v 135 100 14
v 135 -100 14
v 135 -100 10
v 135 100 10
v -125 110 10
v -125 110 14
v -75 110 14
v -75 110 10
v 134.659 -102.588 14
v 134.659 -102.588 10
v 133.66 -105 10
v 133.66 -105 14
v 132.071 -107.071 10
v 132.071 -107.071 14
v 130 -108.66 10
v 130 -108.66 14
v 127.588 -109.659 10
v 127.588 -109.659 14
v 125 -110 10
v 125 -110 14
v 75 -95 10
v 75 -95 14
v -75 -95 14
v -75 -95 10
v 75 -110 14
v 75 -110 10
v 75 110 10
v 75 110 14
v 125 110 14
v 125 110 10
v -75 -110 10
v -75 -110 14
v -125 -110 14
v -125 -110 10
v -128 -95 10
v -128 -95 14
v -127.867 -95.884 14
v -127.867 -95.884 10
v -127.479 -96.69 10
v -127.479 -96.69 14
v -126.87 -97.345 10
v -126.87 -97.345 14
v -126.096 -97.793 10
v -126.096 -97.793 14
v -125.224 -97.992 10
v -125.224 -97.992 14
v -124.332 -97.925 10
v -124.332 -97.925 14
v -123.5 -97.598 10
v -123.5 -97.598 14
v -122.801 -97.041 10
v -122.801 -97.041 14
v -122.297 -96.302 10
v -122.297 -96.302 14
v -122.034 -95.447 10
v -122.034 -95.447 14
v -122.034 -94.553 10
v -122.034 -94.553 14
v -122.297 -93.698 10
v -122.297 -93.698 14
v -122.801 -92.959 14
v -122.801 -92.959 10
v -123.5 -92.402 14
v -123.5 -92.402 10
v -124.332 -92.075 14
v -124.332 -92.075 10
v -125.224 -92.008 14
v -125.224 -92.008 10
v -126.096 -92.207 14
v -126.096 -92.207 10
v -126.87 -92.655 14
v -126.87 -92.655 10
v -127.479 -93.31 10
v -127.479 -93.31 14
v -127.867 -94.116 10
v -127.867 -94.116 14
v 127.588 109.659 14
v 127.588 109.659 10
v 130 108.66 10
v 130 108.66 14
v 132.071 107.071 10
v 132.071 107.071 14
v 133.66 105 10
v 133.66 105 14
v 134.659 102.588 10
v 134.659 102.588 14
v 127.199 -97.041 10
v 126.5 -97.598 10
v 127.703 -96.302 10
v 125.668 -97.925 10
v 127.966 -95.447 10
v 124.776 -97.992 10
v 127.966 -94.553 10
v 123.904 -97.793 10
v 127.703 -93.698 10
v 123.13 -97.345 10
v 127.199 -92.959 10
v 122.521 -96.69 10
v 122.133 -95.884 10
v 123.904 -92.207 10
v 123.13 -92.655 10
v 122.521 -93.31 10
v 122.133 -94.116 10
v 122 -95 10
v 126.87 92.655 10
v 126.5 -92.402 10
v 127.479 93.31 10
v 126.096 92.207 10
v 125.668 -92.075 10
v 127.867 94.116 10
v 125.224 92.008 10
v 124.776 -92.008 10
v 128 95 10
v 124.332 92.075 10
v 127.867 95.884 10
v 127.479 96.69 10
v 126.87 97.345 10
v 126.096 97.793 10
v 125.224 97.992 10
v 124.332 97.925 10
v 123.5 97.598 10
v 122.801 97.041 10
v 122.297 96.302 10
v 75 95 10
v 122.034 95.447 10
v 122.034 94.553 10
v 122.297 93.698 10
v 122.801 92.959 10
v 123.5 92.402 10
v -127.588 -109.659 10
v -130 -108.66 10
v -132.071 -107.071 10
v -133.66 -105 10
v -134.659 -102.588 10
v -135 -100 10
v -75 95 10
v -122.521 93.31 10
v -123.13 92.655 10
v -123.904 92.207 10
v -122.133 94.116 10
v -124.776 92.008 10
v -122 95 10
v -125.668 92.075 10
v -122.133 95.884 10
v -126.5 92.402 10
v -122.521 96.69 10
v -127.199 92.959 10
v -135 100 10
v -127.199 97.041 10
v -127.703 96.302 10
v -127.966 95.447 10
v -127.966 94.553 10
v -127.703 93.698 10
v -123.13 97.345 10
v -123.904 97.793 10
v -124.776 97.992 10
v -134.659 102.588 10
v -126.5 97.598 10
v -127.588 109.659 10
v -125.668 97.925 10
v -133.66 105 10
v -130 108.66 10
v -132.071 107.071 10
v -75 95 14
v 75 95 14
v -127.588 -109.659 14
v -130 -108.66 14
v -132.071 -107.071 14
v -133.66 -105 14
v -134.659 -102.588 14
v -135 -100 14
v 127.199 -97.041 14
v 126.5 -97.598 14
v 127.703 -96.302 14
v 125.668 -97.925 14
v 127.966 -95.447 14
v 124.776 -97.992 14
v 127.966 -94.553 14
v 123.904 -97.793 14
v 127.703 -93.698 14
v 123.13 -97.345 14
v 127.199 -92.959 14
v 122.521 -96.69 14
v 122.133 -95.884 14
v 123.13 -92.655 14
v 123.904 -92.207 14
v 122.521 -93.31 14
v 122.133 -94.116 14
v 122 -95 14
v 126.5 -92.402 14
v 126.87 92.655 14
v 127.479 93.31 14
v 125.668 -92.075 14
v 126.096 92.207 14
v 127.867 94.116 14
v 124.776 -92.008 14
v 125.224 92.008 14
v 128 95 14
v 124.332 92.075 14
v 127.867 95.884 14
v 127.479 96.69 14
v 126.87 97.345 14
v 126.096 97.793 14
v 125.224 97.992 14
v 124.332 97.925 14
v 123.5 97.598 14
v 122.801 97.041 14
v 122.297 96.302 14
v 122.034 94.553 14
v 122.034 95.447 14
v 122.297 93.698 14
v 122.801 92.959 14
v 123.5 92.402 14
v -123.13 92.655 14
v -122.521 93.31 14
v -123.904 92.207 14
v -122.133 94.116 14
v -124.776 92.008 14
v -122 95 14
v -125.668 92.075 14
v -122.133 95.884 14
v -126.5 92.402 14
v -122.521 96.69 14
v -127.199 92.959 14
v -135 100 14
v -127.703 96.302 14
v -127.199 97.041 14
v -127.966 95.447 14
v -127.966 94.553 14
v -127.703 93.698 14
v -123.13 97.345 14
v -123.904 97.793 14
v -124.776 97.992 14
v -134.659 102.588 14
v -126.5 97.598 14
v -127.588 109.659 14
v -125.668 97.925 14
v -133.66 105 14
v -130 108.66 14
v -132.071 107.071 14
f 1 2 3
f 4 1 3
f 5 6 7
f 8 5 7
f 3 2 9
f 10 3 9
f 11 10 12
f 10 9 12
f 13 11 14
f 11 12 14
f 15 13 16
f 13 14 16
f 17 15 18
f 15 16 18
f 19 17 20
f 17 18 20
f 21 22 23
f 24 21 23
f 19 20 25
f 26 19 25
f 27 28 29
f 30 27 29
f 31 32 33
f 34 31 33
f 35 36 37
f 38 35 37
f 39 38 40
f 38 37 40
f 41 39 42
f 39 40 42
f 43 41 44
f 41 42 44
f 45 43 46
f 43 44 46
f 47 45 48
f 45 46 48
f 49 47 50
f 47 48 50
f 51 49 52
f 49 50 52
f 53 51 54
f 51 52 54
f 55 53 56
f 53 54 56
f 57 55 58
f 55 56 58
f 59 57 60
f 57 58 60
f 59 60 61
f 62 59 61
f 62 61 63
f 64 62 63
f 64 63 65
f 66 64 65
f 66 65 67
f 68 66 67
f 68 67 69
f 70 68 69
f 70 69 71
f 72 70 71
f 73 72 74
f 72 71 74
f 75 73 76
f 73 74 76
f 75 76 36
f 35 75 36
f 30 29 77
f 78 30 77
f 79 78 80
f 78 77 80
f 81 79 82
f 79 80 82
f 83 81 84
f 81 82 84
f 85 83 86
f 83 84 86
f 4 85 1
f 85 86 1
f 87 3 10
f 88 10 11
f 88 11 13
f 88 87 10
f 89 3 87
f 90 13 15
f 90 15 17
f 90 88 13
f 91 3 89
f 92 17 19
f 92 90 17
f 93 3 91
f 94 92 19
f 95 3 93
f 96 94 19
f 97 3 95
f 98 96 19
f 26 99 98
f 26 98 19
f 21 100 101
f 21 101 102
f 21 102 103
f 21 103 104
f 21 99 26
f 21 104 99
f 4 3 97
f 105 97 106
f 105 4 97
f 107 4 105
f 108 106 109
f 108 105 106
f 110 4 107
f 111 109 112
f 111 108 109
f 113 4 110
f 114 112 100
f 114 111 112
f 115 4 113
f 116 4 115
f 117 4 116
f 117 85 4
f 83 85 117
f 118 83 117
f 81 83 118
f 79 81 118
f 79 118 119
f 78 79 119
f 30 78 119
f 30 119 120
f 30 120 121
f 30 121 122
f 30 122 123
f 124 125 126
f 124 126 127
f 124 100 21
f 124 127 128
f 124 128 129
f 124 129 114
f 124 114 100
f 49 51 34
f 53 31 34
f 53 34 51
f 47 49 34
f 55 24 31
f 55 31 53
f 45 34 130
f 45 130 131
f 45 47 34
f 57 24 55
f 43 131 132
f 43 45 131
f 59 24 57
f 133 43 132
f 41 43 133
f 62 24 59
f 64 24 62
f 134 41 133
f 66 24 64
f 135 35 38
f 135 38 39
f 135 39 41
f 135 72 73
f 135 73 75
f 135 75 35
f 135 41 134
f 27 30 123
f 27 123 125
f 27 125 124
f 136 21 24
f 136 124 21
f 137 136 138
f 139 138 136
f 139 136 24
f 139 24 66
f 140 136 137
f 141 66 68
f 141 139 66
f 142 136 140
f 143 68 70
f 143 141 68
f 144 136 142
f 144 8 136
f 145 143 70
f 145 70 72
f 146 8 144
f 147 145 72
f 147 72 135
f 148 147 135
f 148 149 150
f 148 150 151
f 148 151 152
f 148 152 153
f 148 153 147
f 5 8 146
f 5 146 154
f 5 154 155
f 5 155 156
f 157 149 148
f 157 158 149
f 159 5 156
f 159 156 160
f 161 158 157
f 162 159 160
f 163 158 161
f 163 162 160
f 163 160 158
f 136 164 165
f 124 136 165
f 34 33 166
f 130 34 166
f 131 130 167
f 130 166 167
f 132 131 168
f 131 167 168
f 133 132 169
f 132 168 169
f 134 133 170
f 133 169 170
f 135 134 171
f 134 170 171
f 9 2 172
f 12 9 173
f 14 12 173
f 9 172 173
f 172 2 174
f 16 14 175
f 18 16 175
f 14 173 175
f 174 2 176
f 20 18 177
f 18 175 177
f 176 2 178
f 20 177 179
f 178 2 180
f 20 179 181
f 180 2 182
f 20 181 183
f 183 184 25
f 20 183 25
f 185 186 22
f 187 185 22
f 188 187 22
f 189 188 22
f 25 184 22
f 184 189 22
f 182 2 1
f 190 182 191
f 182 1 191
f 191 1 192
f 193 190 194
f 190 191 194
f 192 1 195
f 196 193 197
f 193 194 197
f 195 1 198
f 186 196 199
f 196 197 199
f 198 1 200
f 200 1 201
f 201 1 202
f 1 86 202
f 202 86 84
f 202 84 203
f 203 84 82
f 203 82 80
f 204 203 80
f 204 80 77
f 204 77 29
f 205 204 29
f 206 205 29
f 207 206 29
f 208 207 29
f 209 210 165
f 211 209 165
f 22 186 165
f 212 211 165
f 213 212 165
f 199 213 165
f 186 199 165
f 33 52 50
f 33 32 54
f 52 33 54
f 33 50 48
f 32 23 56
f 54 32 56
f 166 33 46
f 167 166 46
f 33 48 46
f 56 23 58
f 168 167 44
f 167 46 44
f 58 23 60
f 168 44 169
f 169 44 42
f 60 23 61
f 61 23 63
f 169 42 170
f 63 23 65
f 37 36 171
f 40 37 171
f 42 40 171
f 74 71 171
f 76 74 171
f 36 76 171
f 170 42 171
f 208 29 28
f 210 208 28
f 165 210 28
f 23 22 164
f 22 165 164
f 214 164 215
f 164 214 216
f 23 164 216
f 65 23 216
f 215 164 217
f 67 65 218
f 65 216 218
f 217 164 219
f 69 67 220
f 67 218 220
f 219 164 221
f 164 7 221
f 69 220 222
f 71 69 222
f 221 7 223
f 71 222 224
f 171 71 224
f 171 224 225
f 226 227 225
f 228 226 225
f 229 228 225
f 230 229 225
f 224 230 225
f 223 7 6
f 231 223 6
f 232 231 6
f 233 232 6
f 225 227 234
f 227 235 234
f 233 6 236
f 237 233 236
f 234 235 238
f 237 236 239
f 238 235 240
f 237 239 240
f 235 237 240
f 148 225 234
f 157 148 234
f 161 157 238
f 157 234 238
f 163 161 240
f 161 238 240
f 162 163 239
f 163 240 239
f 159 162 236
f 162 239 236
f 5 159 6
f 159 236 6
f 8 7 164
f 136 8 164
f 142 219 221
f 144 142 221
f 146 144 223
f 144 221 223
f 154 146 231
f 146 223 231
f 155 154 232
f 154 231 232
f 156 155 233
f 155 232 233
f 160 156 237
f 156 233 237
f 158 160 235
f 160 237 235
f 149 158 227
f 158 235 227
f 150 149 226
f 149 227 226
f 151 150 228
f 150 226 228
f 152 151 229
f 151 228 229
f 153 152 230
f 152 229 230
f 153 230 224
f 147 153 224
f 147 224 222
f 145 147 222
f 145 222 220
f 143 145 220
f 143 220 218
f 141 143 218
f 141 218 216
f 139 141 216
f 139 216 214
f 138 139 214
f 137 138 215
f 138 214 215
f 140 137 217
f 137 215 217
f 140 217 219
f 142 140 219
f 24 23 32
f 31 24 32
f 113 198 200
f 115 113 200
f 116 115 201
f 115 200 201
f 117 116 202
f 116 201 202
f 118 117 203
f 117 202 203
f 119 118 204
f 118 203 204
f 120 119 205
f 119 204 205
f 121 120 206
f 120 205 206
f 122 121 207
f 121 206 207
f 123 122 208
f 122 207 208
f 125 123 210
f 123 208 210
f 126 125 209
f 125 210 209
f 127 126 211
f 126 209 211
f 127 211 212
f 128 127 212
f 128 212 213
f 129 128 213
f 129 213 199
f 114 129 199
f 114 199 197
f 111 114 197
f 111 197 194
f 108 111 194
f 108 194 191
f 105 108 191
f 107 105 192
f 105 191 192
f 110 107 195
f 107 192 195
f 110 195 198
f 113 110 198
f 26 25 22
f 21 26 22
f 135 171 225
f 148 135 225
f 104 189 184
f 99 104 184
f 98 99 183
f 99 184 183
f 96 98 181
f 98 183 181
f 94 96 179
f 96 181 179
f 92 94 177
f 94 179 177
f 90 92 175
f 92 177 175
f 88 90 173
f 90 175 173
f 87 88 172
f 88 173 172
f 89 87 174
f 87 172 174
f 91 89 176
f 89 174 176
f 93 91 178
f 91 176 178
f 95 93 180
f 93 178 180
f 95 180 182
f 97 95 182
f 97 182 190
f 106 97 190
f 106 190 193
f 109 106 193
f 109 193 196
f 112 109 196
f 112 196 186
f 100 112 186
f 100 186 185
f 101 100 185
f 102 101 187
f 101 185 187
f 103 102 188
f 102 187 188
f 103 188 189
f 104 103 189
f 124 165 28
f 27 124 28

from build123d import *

# Parameters (mm, degrees)
SKETCH1_R               = 3
SKETCH1_W               = 33
SKETCH1_H               = 80
BOSS_EXTRUDE1_DEPTH     = 14
SKETCH4_R               = 2
CUT_EXTRUDE2_DEPTH      = 10
SKETCH5_R               = 2
CUT_EXTRUDE3_DEPTH      = 10
SKETCH6_R               = 3
BOSS_EXTRUDE2_DEPTH     = 4
BOSS_EXTRUDE2_2_DEPTH   = 4
SKETCH7_R               = 6.85
SKETCH7_R_2             = 1.5
CUT_EXTRUDE4_DEPTH      = 10
ESQUISSE2_W             = 270
ESQUISSE2_H             = 10
ENL_V_MAT_EXTRU_1_DEPTH = 260
ESQUISSE3_W             = 4
ESQUISSE3_H             = 176.46718548
BOSS_EXTRU_3_DEPTH      = 265


with BuildPart() as part:
    # Sketch1 → Boss-Extrude1 (new body)
    with BuildSketch(Plane.XY):
        Polygon((-135, -20.635083269), (-135, -50), (135, -50), (135, -20.635083269), (135, 40), (135, 50), (-135, 50), (-135, 40), align=None)
        with Locations((-85, -43)):
            Circle(SKETCH1_R, mode=Mode.SUBTRACT)
        with Locations((-80, 43)):
            Circle(SKETCH1_R, mode=Mode.SUBTRACT)
        with Locations(Location((80, 43, 0), (0, 0, 180))):
            Circle(SKETCH1_R, mode=Mode.SUBTRACT)
        with Locations(Location((85, -43, 0), (0, 0, 180))):
            Circle(SKETCH1_R, mode=Mode.SUBTRACT)
        with Locations((-110.5, 0)):
            Rectangle(SKETCH1_W, SKETCH1_H, mode=Mode.SUBTRACT)
        Polygon((-61, -30), (-35, -30), (-35, -20), (-4, -20), (-4, 20), (-35, 20), (-35, 30), (-61, 30), align=None, mode=Mode.SUBTRACT)
        Polygon((35, 20), (35, 30), (61, 30), (61, -30), (35, -30), (35, -20), (4, -20), (4, 20), align=None, mode=Mode.SUBTRACT)
        with Locations((110.5, 5)):
            Rectangle(SKETCH1_W, SKETCH1_H, mode=Mode.SUBTRACT)
    extrude(amount=BOSS_EXTRUDE1_DEPTH)

    # Sketch4 → Cut-Extrude2 (cut)
    with BuildSketch(Plane(origin=(0, 0, 0), x_dir=(-1, 0, 0), z_dir=(0, 0, -1))):
        with Locations((-131.5, 5)):
            Circle(SKETCH4_R)
    cut_extrude2 = extrude(amount=-CUT_EXTRUDE2_DEPTH, mode=Mode.SUBTRACT)

    # Sketch5 → Cut-Extrude3 (cut)
    with BuildSketch(Plane(origin=(0, 0, 0), x_dir=(-1, 0, 0), z_dir=(0, 0, -1))):
        with Locations((-69, 5)):
            Circle(SKETCH5_R)
    cut_extrude3 = extrude(amount=-CUT_EXTRUDE3_DEPTH, mode=Mode.SUBTRACT)

    # Mirror1: Cut-Extrude2, Cut-Extrude3 across plane
    add(cut_extrude2.mirror(Plane.ZY), mode=Mode.SUBTRACT)
    add(cut_extrude3.mirror(Plane.ZY), mode=Mode.SUBTRACT)


with BuildPart() as body_2:
    # Sketch6 → Boss-Extrude2 (new body)
    with BuildSketch(Plane.XY.offset(14)):
        with BuildLine():
            Line((75, 110), (125, 110))
            ThreePointArc((125, 110), (132.071067812, 107.071067812), (135, 100))
            Line((135, 100), (135, 50))
            Line((135, 50), (-135, 50))
            Line((-135, 50), (-135, 100))
            ThreePointArc((-135, 100), (-132.071067812, 107.071067812), (-125, 110))
            Line((-125, 110), (-75, 110))
            Line((-75, 110), (-75, 95))
            Line((-75, 95), (75, 95))
            Line((75, 95), (75, 110))
        make_face()
        with Locations((-125, 95)):
            Circle(SKETCH6_R, mode=Mode.SUBTRACT)
        with Locations((125, 95)):
            Circle(SKETCH6_R, mode=Mode.SUBTRACT)
    extrude(amount=-BOSS_EXTRUDE2_DEPTH)

    # Combine1: union part
    add(part.part)


with BuildPart() as body_3:
    # Sketch6 → Boss-Extrude2 2 (new body)
    with BuildSketch(Plane.XY.offset(14)):
        with BuildLine():
            Line((75, -110), (75, -95))
            Line((75, -95), (-75, -95))
            Line((-75, -95), (-75, -110))
            Line((-75, -110), (-125, -110))
            ThreePointArc((-125, -110), (-132.071067812, -107.071067812), (-135, -100))
            Line((-135, -100), (-135, -50))
            Line((-135, -50), (135, -50))
            Line((135, -50), (135, -100))
            ThreePointArc((135, -100), (132.071067812, -107.071067812), (125, -110))
            Line((125, -110), (75, -110))
        make_face()
        with Locations(Location((125, -95, 0), (0, 0, 180))):
            Circle(SKETCH6_R, mode=Mode.SUBTRACT)
        with Locations(Location((-125, -95, 0), (0, 0, 180))):
            Circle(SKETCH6_R, mode=Mode.SUBTRACT)
    extrude(amount=-BOSS_EXTRUDE2_2_DEPTH)


with BuildPart() as body_2_1:
    add(body_2.part)

    # Combine2: union body 3
    add(body_3.part)

    # Sketch7 → Cut-Extrude4 (cut)
    with BuildSketch(Plane.XY.offset(14)):
        with Locations((0, 70)):
            Circle(SKETCH7_R)
        with Locations((-11.25, 76.495190528)):
            Circle(SKETCH7_R_2)
        with Locations((0, 57.009618943)):
            Circle(SKETCH7_R_2)
        with Locations((0, -70)):
            Circle(SKETCH7_R)
        with Locations((0, -57.009618943)):
            Circle(SKETCH7_R_2)
        with Locations(Location((11.25, 76.495190528, 0), (0, 0, 180))):
            Circle(SKETCH7_R_2)
        with Locations((-11.25, -76.495190528)):
            Circle(SKETCH7_R_2)
        with Locations((11.25, -76.495190528)):
            Circle(SKETCH7_R_2)
    extrude(amount=-CUT_EXTRUDE4_DEPTH, mode=Mode.SUBTRACT)

    # Esquisse2 → Enlèv. mat.-Extru.1 (cut)
    with BuildSketch(Plane.XZ.offset(50)):
        with Locations((0, 5)):
            Rectangle(ESQUISSE2_W, ESQUISSE2_H)
    extrude(amount=-ENL_V_MAT_EXTRU_1_DEPTH, mode=Mode.SUBTRACT)

    # Esquisse3 → Boss.-Extru.3 (add)
    with BuildSketch(Plane(origin=(135, 0, 0), x_dir=(0, 0, -1), z_dir=(1, 0, 0))):
        with Locations((-12, 0.244857916)):
            Rectangle(ESQUISSE3_W, ESQUISSE3_H)
    extrude(amount=-BOSS_EXTRU_3_DEPTH)


solid = body_2_1.part
